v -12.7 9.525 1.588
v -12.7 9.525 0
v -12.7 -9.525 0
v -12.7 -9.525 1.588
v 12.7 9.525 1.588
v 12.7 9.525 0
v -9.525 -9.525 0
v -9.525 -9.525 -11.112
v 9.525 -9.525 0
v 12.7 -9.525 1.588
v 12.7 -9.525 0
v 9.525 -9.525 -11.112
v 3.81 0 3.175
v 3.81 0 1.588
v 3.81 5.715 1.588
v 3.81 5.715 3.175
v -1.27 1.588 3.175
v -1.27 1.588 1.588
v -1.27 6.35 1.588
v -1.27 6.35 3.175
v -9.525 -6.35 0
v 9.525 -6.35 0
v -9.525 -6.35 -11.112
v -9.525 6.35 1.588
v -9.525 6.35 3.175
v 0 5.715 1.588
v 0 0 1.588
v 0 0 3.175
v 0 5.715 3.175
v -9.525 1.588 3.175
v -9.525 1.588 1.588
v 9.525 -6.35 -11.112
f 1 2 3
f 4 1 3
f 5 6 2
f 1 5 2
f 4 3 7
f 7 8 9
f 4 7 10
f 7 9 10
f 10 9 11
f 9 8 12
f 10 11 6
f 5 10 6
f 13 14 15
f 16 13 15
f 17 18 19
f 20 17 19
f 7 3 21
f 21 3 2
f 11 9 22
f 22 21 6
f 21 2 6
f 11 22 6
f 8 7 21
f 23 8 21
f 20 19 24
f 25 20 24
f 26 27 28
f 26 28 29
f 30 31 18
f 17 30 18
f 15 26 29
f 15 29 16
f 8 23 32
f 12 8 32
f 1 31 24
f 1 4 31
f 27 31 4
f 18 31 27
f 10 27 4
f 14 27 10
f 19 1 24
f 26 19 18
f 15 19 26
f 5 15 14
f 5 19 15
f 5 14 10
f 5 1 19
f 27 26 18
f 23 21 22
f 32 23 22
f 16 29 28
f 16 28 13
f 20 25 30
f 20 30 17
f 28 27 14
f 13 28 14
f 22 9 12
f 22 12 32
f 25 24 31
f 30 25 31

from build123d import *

# Parameters (mm, degrees)
F0_W     = 3.175
F0_H     = 3.175
F0_W_2   = 8.255
F0_H_2   = 15.875
F1_DEPTH = 1.5875
F0_W_3   = 3.81
F0_H_3   = 5.715
F2_DEPTH = 3.175
F0_W_4   = 19.05
F3_DEPTH = 1.5875
F4_DEPTH = 11.1125


with BuildPart() as f1:
    # F0 (on Top) → F1 (new body)
    with BuildSketch(Plane.XY):
        with Locations((-11.1125, -7.9375)):
            Rectangle(F0_W, F0_H)
        Polygon((-12.7, -6.35), (-9.525, -6.35), (-9.525, 1.5875), (-9.525, 6.35), (-9.525, 9.525), (-12.7, 9.525), align=None)
        Polygon((9.525, -6.35), (9.525, 9.525), (3.81, 9.525), (3.81, 5.715), (3.81, 0), (0, 0), (0, 5.715), (-1.27, 5.715), (-1.27, 1.5875), (-9.525, 1.5875), (-9.525, -6.35), align=None)
        with Locations((-5.3975, 7.9375)):
            Rectangle(F0_W_2, F0_H)
        Polygon((3.81, 5.715), (3.81, 9.525), (-1.27, 9.525), (-1.27, 6.35), (-1.27, 5.715), (0, 5.715), align=None)
        with Locations((11.1125, 1.5875)):
            Rectangle(F0_W, F0_H_2)
        with Locations((11.1125, -7.9375)):
            Rectangle(F0_W, F0_H)
    extrude(amount=F1_DEPTH)

    # F0 (on Top) → F2 (join)
    with BuildSketch(Plane.XY):
        Polygon((-1.27, 5.715), (-1.27, 6.35), (-9.525, 6.35), (-9.525, 1.5875), (-1.27, 1.5875), align=None)
        with Locations((1.905, 2.8575)):
            Rectangle(F0_W_3, F0_H_3)
    extrude(amount=F2_DEPTH)

    # F0 (on Top) → F3 (join)
    with BuildSketch(Plane.XY):
        with Locations((0, -7.9375)):
            Rectangle(F0_W_4, F0_H)
    extrude(amount=F3_DEPTH)

    # F0 (on Top) → F4 (join)
    with BuildSketch(Plane.XY):
        with Locations((0, -7.9375)):
            Rectangle(F0_W_4, F0_H)
    extrude(amount=-F4_DEPTH)


solid = f1.part
